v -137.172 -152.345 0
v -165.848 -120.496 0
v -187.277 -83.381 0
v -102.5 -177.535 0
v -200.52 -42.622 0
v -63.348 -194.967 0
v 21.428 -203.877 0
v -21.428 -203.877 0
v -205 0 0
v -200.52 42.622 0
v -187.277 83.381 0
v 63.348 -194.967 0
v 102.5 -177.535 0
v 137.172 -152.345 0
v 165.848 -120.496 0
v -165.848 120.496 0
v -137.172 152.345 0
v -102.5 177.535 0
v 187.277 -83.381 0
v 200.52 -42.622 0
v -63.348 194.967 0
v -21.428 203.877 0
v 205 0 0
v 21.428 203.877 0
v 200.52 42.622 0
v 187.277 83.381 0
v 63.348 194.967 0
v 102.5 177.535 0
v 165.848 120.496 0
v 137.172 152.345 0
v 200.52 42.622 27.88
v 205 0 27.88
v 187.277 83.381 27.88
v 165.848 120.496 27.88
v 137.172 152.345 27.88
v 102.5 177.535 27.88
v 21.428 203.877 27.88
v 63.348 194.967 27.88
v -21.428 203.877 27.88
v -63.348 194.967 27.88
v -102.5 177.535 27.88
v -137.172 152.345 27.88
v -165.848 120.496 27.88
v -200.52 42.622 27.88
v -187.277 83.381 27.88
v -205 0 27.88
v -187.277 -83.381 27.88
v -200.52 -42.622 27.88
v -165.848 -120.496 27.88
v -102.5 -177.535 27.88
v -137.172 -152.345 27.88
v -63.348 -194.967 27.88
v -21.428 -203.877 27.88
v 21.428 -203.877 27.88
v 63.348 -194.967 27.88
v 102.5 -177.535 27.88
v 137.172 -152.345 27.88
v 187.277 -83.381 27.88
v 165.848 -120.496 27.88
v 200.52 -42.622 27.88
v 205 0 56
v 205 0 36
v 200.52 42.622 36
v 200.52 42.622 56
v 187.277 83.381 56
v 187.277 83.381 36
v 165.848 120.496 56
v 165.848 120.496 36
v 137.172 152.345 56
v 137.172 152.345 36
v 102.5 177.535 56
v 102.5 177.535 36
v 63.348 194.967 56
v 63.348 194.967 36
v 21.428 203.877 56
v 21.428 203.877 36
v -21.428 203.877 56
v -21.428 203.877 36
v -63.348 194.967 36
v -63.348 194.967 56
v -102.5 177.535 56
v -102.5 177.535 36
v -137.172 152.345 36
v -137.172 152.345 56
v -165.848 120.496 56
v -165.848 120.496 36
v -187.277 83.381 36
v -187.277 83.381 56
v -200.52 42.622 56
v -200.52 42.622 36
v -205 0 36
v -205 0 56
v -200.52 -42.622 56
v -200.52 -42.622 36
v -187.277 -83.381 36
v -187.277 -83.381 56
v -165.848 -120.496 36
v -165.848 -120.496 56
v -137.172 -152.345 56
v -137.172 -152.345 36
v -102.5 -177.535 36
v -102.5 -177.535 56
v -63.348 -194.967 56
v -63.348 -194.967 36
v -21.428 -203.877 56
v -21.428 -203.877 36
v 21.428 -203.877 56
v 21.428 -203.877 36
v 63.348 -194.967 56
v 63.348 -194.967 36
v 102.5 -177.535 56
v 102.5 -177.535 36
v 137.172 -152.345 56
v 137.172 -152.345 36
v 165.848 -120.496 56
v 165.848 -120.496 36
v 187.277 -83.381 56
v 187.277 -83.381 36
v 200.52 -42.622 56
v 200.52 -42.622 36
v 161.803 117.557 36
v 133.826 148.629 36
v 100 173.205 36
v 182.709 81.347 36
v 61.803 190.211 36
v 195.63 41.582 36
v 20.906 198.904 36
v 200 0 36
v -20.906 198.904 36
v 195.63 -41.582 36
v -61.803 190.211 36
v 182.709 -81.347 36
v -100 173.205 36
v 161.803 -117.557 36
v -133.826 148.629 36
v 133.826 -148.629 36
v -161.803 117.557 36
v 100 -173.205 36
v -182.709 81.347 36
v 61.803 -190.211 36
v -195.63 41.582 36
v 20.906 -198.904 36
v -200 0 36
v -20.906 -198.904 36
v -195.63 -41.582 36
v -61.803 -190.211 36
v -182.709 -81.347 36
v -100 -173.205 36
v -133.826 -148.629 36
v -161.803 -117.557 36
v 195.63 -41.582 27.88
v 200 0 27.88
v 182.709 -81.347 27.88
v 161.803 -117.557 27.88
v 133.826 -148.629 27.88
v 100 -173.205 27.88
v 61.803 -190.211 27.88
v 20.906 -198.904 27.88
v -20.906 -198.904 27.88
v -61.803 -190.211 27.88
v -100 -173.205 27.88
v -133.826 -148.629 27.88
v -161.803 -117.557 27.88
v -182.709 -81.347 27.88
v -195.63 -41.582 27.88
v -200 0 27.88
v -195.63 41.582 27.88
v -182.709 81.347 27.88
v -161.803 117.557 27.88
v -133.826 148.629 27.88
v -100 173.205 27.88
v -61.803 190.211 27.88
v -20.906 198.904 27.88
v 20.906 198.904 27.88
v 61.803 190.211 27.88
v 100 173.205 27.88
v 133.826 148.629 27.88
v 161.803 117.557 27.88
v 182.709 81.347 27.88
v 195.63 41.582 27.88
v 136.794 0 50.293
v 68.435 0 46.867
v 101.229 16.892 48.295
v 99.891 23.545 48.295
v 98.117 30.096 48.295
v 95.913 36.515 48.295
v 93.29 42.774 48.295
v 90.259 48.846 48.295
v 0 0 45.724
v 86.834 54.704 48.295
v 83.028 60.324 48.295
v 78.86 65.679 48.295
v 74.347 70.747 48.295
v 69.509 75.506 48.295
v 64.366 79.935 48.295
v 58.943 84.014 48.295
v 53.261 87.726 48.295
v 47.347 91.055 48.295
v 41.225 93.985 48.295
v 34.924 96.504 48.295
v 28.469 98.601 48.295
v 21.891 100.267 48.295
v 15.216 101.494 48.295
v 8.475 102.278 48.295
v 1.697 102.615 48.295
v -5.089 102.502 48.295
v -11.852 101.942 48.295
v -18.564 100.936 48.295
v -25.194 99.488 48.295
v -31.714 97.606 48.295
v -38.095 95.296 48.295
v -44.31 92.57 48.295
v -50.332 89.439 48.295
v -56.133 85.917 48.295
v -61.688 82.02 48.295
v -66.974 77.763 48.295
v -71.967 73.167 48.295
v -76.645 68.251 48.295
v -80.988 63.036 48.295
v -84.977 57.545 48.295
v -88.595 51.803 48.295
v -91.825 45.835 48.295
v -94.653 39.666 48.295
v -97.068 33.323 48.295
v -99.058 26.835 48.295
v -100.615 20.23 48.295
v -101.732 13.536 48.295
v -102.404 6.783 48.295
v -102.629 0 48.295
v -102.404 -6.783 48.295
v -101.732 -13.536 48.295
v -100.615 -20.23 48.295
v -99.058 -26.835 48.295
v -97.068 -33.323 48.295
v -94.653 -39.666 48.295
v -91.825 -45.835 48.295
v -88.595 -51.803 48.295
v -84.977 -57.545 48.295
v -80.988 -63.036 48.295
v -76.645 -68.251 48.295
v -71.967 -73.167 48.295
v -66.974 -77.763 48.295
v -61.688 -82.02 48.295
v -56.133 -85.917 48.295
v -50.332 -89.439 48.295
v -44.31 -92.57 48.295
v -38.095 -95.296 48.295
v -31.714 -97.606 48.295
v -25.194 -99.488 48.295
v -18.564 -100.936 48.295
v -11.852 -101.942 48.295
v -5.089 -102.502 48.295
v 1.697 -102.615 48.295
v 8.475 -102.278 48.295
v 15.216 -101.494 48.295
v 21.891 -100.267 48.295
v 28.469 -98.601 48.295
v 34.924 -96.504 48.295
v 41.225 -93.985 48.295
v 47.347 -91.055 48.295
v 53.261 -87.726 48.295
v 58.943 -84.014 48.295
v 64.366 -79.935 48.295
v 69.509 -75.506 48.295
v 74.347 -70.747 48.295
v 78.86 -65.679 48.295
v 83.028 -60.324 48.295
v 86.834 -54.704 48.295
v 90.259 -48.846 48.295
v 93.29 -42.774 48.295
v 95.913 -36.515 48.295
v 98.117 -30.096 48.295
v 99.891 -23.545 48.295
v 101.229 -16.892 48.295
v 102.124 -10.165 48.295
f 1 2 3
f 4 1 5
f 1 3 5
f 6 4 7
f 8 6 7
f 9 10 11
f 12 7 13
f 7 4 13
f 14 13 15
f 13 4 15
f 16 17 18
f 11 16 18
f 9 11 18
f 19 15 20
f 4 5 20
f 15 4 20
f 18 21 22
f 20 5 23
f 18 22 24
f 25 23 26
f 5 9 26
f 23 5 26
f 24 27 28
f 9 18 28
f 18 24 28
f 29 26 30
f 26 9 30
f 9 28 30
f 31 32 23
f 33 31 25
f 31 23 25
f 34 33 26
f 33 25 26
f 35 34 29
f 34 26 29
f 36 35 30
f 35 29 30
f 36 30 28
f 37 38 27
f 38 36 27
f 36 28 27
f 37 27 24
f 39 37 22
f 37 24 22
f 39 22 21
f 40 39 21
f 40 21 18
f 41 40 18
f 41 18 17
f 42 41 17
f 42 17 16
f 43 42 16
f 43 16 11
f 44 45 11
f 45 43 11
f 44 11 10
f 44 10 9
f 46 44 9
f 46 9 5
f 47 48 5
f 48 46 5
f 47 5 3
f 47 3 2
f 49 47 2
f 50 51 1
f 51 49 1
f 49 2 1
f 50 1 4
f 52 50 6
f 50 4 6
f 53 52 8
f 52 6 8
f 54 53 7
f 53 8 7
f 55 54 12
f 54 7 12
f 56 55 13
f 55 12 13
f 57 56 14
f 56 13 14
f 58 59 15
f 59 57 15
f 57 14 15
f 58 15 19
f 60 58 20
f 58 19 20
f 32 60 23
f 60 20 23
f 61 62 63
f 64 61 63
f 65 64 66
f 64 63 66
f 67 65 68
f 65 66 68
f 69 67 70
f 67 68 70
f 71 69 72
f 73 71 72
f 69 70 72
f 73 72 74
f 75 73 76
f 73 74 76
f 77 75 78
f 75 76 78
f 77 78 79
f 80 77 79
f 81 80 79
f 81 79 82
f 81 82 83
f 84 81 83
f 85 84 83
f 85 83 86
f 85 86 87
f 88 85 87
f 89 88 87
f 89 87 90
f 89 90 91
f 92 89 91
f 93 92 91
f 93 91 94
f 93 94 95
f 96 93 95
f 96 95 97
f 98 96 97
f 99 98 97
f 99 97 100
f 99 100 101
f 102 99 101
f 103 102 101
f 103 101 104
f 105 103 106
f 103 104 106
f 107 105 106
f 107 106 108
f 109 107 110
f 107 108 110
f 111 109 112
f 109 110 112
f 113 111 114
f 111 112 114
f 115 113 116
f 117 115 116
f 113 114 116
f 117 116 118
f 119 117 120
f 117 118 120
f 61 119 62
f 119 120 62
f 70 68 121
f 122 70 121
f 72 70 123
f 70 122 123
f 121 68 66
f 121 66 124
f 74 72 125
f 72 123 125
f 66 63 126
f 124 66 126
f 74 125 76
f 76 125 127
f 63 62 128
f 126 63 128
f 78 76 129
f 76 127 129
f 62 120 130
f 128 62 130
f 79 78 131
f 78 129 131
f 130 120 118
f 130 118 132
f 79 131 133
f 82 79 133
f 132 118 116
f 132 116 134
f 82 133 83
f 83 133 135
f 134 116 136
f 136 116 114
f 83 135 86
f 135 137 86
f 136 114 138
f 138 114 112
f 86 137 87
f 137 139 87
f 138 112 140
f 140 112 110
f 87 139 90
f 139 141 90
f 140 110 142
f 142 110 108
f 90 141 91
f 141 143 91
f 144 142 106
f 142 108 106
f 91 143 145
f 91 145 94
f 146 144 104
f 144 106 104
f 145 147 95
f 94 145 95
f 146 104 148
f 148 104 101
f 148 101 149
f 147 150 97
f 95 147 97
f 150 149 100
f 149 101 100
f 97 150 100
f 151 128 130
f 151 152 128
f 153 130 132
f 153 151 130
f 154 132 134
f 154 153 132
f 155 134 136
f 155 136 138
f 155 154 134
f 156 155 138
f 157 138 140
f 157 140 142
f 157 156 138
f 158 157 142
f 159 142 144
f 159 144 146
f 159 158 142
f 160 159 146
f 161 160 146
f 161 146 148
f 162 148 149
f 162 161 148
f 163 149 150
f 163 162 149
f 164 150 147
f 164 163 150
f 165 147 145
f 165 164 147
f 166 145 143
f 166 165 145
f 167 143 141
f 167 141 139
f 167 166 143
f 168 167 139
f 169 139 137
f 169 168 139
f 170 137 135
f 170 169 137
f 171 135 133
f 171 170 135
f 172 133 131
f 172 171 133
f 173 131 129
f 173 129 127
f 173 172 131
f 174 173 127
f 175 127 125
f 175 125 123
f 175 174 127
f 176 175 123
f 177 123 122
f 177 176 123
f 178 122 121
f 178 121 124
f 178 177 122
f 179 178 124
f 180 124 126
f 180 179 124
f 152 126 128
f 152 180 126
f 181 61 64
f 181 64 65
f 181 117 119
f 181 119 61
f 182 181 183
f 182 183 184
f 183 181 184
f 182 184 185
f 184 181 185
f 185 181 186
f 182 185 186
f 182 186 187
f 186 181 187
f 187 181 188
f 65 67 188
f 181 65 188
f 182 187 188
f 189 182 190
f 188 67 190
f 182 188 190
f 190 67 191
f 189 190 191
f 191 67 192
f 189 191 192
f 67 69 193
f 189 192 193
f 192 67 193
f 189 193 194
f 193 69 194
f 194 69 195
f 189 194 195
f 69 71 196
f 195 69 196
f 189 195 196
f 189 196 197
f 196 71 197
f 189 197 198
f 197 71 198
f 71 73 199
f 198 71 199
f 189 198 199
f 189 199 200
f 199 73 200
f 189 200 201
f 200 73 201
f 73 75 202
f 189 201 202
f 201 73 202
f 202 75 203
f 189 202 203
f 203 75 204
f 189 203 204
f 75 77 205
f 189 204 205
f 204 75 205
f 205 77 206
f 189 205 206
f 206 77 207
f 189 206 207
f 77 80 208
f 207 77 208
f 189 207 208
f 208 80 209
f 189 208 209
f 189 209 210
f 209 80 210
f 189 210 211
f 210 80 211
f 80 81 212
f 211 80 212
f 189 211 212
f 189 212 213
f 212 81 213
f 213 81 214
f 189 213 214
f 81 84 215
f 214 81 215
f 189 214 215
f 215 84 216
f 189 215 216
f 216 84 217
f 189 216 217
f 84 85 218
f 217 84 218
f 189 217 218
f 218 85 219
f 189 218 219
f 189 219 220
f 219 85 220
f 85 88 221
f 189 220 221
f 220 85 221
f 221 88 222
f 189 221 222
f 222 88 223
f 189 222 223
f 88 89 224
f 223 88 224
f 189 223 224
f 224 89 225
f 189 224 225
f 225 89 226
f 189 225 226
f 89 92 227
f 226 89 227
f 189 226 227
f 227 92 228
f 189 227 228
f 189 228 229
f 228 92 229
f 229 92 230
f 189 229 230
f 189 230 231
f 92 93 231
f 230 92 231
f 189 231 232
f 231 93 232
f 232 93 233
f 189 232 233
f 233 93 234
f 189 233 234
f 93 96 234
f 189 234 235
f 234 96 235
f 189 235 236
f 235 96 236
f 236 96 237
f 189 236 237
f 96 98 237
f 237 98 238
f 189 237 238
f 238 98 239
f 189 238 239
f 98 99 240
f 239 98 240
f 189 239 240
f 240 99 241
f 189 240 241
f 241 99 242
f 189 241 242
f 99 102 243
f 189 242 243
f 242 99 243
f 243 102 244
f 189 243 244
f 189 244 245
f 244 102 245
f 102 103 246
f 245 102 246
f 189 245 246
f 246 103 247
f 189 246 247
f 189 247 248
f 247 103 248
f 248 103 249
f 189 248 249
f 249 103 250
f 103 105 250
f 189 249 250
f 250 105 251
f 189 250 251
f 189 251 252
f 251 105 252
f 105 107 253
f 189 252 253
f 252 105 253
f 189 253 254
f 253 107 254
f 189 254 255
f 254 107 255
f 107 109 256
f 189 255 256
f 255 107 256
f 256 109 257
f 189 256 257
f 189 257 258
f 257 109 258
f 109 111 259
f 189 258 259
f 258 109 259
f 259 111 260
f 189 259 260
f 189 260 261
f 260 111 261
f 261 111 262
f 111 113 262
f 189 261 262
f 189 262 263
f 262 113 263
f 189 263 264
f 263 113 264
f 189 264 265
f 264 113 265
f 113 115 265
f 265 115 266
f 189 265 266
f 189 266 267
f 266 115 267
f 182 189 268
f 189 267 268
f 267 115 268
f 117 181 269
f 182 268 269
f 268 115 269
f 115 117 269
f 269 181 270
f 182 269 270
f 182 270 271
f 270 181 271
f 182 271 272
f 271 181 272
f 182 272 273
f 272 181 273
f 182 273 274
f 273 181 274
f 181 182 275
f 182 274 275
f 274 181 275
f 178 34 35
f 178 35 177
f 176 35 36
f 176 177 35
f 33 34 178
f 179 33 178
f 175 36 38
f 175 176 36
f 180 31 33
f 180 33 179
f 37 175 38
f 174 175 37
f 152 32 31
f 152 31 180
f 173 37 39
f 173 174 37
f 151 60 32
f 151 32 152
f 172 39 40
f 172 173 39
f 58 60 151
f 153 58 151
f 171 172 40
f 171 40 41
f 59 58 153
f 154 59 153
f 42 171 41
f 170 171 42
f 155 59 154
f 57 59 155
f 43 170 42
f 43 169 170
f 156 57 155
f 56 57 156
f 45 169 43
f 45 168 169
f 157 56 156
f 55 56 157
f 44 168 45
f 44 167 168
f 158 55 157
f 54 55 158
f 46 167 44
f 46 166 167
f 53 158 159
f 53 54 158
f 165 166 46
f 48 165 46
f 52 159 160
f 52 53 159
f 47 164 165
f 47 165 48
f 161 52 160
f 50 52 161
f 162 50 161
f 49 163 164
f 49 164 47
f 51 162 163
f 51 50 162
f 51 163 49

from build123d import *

# Parameters (mm, degrees)
ESQUISSE1_R        = 205
BOSS_EXTRU_1_DEPTH = 56
ESQUISSE3_W        = 5
ESQUISSE3_H        = 8.12


with BuildPart() as part:
    # Esquisse1 → Boss.-Extru.1 (new body)
    with BuildSketch(Plane.XY):
        Circle(ESQUISSE1_R)
    extrude(amount=BOSS_EXTRU_1_DEPTH)

    # Esquisse2 → Enlèvement de matière-Révolution6 (revolve, cut)
    with BuildSketch(Plane(origin=(0, 0, 0), x_dir=(1, 0, 0), z_dir=(0, 1, 0))):
        with BuildLine():
            Line((0, -2095.724246069), (0, -45.724246069))
            ThreePointArc((0, -45.724246069), (1449.568901432, -646.155344636), (2050, -2095.724246069))
            Line((2050, -2095.724246069), (0, -2095.724246069))
        make_face()
    revolve(axis=Axis((0, 0, 0), (0, 0, 1)), mode=Mode.SUBTRACT)

    # Esquisse3 → Enlèvement de matière-Révolution7 (revolve, cut)
    with BuildSketch(Plane(origin=(0, 0, 0), x_dir=(1, 0, 0), z_dir=(0, 1, 0))):
        with Locations((202.5, -31.94)):
            Rectangle(ESQUISSE3_W, ESQUISSE3_H)
    revolve(axis=Axis((0, 0, 2095.724246069), (0, 0, -1)), mode=Mode.SUBTRACT)


solid = part.part
